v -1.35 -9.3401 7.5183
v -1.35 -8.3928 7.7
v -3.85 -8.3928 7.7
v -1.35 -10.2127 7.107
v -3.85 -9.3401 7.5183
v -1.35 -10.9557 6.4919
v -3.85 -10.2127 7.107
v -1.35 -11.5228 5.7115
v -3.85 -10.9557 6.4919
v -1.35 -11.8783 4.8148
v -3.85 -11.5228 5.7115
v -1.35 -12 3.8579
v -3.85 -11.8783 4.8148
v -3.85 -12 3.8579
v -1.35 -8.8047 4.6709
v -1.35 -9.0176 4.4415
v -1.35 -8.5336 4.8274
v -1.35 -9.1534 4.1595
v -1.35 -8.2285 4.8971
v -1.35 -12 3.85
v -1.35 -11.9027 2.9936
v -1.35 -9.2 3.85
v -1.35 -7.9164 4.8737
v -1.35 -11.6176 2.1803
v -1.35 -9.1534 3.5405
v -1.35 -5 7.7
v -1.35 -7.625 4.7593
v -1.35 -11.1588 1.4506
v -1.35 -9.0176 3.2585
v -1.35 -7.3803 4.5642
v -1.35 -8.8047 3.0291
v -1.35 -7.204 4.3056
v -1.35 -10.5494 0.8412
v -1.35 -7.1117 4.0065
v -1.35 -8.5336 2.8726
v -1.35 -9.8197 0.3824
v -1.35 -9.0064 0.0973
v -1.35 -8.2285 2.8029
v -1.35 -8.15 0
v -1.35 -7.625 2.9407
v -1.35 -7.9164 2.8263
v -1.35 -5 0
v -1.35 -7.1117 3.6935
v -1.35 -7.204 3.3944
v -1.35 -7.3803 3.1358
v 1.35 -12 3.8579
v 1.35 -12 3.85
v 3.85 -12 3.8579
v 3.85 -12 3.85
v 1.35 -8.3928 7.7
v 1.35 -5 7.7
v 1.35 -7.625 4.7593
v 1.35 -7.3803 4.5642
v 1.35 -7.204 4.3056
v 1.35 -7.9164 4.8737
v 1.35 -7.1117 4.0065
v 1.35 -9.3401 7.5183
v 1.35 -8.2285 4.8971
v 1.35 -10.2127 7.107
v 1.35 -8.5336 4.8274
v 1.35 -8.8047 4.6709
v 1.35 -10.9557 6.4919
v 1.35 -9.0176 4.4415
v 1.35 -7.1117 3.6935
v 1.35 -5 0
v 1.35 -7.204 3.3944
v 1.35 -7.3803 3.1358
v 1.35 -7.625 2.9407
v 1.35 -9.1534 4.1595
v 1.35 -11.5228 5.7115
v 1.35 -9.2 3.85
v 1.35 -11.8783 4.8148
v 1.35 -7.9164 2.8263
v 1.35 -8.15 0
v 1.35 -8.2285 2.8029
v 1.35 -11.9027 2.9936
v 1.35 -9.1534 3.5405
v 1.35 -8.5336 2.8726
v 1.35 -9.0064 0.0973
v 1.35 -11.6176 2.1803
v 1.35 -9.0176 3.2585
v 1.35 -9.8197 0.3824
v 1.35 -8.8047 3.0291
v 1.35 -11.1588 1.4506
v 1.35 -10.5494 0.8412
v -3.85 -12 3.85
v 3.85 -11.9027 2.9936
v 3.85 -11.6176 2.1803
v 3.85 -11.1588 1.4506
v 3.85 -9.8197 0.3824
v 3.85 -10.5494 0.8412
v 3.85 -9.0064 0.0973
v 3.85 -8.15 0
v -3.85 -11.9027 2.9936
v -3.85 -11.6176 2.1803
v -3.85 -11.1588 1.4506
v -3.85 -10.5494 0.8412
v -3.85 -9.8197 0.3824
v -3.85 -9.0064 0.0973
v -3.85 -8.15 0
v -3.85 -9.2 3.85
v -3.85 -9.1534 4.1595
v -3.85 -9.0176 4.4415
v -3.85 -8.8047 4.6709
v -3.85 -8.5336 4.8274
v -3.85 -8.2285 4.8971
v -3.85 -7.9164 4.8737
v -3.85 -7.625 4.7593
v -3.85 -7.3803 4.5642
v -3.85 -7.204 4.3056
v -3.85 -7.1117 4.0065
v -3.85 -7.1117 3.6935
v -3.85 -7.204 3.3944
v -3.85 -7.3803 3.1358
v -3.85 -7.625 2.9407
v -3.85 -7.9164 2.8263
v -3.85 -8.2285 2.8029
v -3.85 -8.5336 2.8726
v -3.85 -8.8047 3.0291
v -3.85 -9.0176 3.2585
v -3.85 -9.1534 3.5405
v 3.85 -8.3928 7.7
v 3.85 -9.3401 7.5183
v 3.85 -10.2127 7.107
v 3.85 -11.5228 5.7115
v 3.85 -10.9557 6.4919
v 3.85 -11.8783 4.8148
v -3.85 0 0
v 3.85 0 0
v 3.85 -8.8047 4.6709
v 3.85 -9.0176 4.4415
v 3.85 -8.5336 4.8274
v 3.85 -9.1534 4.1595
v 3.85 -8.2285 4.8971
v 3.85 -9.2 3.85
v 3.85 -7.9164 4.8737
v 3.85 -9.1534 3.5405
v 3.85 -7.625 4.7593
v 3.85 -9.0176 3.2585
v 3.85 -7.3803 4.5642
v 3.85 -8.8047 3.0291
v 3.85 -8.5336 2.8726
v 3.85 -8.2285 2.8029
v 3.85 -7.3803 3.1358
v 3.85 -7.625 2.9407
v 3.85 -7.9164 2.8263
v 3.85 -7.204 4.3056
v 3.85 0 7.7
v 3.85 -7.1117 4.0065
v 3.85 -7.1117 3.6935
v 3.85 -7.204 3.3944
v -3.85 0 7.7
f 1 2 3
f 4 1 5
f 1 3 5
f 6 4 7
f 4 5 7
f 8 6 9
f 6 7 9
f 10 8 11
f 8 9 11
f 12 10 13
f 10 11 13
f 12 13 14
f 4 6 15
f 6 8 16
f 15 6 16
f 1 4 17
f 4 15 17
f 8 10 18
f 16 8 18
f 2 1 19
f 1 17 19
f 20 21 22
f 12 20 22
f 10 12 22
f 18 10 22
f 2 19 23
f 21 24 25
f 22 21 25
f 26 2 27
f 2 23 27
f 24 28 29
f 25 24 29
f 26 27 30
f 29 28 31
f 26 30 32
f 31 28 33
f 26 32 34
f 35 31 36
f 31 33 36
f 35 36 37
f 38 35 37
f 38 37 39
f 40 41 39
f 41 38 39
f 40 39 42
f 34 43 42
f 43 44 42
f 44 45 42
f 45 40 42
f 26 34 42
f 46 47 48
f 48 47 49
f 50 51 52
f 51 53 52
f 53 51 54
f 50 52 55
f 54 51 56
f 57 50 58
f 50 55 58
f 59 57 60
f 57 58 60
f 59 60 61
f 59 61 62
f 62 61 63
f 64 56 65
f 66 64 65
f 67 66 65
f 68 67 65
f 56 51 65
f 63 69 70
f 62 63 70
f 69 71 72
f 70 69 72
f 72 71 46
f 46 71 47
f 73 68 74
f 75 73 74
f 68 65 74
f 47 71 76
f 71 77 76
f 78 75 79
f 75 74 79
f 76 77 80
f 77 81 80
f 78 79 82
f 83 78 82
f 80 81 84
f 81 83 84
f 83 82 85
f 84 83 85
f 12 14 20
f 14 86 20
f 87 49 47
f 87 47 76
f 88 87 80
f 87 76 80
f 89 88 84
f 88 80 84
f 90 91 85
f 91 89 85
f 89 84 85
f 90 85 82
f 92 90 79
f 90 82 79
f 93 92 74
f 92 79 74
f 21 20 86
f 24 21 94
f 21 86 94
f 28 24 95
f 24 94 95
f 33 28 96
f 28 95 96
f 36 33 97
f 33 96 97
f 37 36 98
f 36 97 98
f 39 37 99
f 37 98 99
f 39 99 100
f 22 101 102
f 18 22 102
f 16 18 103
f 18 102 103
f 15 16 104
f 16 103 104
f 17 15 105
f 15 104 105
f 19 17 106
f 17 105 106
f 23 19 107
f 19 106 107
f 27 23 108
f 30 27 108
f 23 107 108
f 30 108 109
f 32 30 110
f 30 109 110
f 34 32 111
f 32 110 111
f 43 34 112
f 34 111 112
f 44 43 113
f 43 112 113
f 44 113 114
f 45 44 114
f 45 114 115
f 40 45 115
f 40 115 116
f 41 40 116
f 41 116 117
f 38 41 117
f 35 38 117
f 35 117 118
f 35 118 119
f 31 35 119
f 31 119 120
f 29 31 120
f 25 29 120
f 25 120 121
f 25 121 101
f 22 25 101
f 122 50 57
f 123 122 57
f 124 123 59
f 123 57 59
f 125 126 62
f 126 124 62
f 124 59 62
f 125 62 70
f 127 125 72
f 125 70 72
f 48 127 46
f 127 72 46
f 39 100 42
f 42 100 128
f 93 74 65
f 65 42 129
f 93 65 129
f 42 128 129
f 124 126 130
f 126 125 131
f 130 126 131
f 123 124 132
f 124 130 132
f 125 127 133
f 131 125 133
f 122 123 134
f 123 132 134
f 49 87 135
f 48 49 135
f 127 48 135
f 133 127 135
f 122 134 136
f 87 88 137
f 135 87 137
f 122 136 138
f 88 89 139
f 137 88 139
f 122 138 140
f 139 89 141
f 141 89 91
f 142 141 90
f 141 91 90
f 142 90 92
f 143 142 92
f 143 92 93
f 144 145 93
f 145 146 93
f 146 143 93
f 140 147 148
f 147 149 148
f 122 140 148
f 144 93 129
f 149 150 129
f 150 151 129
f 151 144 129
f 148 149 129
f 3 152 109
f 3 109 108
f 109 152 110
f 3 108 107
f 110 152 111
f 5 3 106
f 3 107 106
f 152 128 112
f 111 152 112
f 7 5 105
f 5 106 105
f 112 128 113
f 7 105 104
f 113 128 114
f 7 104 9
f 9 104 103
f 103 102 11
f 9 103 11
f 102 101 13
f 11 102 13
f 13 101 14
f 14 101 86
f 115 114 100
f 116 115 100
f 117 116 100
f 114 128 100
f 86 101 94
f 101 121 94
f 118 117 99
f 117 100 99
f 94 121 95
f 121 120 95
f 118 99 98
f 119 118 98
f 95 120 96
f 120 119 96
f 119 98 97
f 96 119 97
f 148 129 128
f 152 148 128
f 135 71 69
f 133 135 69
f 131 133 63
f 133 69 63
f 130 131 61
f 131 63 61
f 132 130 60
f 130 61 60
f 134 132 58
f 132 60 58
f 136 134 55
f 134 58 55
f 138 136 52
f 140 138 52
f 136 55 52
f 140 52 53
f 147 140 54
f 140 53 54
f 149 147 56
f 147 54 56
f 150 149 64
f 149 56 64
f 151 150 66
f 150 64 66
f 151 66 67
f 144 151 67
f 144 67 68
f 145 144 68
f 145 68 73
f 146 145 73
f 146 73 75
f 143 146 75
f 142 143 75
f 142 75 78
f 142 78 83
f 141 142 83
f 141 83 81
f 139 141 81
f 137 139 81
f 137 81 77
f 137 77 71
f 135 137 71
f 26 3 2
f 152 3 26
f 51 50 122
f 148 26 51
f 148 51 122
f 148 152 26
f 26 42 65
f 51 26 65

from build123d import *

# Parameters (mm, degrees)
F1_DEPTH = 7.7
F2_R     = 1.05
F3_DEPTH = 10


# Not quite as in the source:
# - ends of sketch curves that miss each other by under 0.0002 mm in the source are joined


with BuildPart() as f1:
    # F0 (on Top) → F1 (new body)
    with BuildSketch(Plane.XY):
        Polygon((3.85, 0), (0, 0), (-3.85, 0), (-3.85, -12), (-1.35, -12), (-1.35, -5), (0, -5), (1.35, -5), (1.35, -12), (3.85, -12), align=None)
    extrude(amount=F1_DEPTH)

    # F2 (on face) → F3 (cut)
    with BuildSketch(Plane(origin=(-3.85, 0, 0), x_dir=(0, -1, 0), z_dir=(-1, 0, 0))):
        with Locations((8.15, 3.85)):
            Circle(F2_R)
        with BuildLine():
            ThreePointArc((8.3927668004, 7.7), (10.9570802224, 6.4904376141), (12.0000020258, 3.8539515808))
            Line((12.0000020258, 3.8539515808), (12, 7.7))
            Line((12, 7.7), (8.3927668004, 7.7))
        make_face()
        with BuildLine():
            ThreePointArc((12.0000020258, 3.8539515808), (10.8726018857, 1.1301923043), (8.15, 0))
            Line((8.15, 0), (12, 0))
            Line((12, 0), (12.0000020258, 3.8539515808))
        make_face()
    extrude(amount=-F3_DEPTH, mode=Mode.SUBTRACT)


solid = f1.part
